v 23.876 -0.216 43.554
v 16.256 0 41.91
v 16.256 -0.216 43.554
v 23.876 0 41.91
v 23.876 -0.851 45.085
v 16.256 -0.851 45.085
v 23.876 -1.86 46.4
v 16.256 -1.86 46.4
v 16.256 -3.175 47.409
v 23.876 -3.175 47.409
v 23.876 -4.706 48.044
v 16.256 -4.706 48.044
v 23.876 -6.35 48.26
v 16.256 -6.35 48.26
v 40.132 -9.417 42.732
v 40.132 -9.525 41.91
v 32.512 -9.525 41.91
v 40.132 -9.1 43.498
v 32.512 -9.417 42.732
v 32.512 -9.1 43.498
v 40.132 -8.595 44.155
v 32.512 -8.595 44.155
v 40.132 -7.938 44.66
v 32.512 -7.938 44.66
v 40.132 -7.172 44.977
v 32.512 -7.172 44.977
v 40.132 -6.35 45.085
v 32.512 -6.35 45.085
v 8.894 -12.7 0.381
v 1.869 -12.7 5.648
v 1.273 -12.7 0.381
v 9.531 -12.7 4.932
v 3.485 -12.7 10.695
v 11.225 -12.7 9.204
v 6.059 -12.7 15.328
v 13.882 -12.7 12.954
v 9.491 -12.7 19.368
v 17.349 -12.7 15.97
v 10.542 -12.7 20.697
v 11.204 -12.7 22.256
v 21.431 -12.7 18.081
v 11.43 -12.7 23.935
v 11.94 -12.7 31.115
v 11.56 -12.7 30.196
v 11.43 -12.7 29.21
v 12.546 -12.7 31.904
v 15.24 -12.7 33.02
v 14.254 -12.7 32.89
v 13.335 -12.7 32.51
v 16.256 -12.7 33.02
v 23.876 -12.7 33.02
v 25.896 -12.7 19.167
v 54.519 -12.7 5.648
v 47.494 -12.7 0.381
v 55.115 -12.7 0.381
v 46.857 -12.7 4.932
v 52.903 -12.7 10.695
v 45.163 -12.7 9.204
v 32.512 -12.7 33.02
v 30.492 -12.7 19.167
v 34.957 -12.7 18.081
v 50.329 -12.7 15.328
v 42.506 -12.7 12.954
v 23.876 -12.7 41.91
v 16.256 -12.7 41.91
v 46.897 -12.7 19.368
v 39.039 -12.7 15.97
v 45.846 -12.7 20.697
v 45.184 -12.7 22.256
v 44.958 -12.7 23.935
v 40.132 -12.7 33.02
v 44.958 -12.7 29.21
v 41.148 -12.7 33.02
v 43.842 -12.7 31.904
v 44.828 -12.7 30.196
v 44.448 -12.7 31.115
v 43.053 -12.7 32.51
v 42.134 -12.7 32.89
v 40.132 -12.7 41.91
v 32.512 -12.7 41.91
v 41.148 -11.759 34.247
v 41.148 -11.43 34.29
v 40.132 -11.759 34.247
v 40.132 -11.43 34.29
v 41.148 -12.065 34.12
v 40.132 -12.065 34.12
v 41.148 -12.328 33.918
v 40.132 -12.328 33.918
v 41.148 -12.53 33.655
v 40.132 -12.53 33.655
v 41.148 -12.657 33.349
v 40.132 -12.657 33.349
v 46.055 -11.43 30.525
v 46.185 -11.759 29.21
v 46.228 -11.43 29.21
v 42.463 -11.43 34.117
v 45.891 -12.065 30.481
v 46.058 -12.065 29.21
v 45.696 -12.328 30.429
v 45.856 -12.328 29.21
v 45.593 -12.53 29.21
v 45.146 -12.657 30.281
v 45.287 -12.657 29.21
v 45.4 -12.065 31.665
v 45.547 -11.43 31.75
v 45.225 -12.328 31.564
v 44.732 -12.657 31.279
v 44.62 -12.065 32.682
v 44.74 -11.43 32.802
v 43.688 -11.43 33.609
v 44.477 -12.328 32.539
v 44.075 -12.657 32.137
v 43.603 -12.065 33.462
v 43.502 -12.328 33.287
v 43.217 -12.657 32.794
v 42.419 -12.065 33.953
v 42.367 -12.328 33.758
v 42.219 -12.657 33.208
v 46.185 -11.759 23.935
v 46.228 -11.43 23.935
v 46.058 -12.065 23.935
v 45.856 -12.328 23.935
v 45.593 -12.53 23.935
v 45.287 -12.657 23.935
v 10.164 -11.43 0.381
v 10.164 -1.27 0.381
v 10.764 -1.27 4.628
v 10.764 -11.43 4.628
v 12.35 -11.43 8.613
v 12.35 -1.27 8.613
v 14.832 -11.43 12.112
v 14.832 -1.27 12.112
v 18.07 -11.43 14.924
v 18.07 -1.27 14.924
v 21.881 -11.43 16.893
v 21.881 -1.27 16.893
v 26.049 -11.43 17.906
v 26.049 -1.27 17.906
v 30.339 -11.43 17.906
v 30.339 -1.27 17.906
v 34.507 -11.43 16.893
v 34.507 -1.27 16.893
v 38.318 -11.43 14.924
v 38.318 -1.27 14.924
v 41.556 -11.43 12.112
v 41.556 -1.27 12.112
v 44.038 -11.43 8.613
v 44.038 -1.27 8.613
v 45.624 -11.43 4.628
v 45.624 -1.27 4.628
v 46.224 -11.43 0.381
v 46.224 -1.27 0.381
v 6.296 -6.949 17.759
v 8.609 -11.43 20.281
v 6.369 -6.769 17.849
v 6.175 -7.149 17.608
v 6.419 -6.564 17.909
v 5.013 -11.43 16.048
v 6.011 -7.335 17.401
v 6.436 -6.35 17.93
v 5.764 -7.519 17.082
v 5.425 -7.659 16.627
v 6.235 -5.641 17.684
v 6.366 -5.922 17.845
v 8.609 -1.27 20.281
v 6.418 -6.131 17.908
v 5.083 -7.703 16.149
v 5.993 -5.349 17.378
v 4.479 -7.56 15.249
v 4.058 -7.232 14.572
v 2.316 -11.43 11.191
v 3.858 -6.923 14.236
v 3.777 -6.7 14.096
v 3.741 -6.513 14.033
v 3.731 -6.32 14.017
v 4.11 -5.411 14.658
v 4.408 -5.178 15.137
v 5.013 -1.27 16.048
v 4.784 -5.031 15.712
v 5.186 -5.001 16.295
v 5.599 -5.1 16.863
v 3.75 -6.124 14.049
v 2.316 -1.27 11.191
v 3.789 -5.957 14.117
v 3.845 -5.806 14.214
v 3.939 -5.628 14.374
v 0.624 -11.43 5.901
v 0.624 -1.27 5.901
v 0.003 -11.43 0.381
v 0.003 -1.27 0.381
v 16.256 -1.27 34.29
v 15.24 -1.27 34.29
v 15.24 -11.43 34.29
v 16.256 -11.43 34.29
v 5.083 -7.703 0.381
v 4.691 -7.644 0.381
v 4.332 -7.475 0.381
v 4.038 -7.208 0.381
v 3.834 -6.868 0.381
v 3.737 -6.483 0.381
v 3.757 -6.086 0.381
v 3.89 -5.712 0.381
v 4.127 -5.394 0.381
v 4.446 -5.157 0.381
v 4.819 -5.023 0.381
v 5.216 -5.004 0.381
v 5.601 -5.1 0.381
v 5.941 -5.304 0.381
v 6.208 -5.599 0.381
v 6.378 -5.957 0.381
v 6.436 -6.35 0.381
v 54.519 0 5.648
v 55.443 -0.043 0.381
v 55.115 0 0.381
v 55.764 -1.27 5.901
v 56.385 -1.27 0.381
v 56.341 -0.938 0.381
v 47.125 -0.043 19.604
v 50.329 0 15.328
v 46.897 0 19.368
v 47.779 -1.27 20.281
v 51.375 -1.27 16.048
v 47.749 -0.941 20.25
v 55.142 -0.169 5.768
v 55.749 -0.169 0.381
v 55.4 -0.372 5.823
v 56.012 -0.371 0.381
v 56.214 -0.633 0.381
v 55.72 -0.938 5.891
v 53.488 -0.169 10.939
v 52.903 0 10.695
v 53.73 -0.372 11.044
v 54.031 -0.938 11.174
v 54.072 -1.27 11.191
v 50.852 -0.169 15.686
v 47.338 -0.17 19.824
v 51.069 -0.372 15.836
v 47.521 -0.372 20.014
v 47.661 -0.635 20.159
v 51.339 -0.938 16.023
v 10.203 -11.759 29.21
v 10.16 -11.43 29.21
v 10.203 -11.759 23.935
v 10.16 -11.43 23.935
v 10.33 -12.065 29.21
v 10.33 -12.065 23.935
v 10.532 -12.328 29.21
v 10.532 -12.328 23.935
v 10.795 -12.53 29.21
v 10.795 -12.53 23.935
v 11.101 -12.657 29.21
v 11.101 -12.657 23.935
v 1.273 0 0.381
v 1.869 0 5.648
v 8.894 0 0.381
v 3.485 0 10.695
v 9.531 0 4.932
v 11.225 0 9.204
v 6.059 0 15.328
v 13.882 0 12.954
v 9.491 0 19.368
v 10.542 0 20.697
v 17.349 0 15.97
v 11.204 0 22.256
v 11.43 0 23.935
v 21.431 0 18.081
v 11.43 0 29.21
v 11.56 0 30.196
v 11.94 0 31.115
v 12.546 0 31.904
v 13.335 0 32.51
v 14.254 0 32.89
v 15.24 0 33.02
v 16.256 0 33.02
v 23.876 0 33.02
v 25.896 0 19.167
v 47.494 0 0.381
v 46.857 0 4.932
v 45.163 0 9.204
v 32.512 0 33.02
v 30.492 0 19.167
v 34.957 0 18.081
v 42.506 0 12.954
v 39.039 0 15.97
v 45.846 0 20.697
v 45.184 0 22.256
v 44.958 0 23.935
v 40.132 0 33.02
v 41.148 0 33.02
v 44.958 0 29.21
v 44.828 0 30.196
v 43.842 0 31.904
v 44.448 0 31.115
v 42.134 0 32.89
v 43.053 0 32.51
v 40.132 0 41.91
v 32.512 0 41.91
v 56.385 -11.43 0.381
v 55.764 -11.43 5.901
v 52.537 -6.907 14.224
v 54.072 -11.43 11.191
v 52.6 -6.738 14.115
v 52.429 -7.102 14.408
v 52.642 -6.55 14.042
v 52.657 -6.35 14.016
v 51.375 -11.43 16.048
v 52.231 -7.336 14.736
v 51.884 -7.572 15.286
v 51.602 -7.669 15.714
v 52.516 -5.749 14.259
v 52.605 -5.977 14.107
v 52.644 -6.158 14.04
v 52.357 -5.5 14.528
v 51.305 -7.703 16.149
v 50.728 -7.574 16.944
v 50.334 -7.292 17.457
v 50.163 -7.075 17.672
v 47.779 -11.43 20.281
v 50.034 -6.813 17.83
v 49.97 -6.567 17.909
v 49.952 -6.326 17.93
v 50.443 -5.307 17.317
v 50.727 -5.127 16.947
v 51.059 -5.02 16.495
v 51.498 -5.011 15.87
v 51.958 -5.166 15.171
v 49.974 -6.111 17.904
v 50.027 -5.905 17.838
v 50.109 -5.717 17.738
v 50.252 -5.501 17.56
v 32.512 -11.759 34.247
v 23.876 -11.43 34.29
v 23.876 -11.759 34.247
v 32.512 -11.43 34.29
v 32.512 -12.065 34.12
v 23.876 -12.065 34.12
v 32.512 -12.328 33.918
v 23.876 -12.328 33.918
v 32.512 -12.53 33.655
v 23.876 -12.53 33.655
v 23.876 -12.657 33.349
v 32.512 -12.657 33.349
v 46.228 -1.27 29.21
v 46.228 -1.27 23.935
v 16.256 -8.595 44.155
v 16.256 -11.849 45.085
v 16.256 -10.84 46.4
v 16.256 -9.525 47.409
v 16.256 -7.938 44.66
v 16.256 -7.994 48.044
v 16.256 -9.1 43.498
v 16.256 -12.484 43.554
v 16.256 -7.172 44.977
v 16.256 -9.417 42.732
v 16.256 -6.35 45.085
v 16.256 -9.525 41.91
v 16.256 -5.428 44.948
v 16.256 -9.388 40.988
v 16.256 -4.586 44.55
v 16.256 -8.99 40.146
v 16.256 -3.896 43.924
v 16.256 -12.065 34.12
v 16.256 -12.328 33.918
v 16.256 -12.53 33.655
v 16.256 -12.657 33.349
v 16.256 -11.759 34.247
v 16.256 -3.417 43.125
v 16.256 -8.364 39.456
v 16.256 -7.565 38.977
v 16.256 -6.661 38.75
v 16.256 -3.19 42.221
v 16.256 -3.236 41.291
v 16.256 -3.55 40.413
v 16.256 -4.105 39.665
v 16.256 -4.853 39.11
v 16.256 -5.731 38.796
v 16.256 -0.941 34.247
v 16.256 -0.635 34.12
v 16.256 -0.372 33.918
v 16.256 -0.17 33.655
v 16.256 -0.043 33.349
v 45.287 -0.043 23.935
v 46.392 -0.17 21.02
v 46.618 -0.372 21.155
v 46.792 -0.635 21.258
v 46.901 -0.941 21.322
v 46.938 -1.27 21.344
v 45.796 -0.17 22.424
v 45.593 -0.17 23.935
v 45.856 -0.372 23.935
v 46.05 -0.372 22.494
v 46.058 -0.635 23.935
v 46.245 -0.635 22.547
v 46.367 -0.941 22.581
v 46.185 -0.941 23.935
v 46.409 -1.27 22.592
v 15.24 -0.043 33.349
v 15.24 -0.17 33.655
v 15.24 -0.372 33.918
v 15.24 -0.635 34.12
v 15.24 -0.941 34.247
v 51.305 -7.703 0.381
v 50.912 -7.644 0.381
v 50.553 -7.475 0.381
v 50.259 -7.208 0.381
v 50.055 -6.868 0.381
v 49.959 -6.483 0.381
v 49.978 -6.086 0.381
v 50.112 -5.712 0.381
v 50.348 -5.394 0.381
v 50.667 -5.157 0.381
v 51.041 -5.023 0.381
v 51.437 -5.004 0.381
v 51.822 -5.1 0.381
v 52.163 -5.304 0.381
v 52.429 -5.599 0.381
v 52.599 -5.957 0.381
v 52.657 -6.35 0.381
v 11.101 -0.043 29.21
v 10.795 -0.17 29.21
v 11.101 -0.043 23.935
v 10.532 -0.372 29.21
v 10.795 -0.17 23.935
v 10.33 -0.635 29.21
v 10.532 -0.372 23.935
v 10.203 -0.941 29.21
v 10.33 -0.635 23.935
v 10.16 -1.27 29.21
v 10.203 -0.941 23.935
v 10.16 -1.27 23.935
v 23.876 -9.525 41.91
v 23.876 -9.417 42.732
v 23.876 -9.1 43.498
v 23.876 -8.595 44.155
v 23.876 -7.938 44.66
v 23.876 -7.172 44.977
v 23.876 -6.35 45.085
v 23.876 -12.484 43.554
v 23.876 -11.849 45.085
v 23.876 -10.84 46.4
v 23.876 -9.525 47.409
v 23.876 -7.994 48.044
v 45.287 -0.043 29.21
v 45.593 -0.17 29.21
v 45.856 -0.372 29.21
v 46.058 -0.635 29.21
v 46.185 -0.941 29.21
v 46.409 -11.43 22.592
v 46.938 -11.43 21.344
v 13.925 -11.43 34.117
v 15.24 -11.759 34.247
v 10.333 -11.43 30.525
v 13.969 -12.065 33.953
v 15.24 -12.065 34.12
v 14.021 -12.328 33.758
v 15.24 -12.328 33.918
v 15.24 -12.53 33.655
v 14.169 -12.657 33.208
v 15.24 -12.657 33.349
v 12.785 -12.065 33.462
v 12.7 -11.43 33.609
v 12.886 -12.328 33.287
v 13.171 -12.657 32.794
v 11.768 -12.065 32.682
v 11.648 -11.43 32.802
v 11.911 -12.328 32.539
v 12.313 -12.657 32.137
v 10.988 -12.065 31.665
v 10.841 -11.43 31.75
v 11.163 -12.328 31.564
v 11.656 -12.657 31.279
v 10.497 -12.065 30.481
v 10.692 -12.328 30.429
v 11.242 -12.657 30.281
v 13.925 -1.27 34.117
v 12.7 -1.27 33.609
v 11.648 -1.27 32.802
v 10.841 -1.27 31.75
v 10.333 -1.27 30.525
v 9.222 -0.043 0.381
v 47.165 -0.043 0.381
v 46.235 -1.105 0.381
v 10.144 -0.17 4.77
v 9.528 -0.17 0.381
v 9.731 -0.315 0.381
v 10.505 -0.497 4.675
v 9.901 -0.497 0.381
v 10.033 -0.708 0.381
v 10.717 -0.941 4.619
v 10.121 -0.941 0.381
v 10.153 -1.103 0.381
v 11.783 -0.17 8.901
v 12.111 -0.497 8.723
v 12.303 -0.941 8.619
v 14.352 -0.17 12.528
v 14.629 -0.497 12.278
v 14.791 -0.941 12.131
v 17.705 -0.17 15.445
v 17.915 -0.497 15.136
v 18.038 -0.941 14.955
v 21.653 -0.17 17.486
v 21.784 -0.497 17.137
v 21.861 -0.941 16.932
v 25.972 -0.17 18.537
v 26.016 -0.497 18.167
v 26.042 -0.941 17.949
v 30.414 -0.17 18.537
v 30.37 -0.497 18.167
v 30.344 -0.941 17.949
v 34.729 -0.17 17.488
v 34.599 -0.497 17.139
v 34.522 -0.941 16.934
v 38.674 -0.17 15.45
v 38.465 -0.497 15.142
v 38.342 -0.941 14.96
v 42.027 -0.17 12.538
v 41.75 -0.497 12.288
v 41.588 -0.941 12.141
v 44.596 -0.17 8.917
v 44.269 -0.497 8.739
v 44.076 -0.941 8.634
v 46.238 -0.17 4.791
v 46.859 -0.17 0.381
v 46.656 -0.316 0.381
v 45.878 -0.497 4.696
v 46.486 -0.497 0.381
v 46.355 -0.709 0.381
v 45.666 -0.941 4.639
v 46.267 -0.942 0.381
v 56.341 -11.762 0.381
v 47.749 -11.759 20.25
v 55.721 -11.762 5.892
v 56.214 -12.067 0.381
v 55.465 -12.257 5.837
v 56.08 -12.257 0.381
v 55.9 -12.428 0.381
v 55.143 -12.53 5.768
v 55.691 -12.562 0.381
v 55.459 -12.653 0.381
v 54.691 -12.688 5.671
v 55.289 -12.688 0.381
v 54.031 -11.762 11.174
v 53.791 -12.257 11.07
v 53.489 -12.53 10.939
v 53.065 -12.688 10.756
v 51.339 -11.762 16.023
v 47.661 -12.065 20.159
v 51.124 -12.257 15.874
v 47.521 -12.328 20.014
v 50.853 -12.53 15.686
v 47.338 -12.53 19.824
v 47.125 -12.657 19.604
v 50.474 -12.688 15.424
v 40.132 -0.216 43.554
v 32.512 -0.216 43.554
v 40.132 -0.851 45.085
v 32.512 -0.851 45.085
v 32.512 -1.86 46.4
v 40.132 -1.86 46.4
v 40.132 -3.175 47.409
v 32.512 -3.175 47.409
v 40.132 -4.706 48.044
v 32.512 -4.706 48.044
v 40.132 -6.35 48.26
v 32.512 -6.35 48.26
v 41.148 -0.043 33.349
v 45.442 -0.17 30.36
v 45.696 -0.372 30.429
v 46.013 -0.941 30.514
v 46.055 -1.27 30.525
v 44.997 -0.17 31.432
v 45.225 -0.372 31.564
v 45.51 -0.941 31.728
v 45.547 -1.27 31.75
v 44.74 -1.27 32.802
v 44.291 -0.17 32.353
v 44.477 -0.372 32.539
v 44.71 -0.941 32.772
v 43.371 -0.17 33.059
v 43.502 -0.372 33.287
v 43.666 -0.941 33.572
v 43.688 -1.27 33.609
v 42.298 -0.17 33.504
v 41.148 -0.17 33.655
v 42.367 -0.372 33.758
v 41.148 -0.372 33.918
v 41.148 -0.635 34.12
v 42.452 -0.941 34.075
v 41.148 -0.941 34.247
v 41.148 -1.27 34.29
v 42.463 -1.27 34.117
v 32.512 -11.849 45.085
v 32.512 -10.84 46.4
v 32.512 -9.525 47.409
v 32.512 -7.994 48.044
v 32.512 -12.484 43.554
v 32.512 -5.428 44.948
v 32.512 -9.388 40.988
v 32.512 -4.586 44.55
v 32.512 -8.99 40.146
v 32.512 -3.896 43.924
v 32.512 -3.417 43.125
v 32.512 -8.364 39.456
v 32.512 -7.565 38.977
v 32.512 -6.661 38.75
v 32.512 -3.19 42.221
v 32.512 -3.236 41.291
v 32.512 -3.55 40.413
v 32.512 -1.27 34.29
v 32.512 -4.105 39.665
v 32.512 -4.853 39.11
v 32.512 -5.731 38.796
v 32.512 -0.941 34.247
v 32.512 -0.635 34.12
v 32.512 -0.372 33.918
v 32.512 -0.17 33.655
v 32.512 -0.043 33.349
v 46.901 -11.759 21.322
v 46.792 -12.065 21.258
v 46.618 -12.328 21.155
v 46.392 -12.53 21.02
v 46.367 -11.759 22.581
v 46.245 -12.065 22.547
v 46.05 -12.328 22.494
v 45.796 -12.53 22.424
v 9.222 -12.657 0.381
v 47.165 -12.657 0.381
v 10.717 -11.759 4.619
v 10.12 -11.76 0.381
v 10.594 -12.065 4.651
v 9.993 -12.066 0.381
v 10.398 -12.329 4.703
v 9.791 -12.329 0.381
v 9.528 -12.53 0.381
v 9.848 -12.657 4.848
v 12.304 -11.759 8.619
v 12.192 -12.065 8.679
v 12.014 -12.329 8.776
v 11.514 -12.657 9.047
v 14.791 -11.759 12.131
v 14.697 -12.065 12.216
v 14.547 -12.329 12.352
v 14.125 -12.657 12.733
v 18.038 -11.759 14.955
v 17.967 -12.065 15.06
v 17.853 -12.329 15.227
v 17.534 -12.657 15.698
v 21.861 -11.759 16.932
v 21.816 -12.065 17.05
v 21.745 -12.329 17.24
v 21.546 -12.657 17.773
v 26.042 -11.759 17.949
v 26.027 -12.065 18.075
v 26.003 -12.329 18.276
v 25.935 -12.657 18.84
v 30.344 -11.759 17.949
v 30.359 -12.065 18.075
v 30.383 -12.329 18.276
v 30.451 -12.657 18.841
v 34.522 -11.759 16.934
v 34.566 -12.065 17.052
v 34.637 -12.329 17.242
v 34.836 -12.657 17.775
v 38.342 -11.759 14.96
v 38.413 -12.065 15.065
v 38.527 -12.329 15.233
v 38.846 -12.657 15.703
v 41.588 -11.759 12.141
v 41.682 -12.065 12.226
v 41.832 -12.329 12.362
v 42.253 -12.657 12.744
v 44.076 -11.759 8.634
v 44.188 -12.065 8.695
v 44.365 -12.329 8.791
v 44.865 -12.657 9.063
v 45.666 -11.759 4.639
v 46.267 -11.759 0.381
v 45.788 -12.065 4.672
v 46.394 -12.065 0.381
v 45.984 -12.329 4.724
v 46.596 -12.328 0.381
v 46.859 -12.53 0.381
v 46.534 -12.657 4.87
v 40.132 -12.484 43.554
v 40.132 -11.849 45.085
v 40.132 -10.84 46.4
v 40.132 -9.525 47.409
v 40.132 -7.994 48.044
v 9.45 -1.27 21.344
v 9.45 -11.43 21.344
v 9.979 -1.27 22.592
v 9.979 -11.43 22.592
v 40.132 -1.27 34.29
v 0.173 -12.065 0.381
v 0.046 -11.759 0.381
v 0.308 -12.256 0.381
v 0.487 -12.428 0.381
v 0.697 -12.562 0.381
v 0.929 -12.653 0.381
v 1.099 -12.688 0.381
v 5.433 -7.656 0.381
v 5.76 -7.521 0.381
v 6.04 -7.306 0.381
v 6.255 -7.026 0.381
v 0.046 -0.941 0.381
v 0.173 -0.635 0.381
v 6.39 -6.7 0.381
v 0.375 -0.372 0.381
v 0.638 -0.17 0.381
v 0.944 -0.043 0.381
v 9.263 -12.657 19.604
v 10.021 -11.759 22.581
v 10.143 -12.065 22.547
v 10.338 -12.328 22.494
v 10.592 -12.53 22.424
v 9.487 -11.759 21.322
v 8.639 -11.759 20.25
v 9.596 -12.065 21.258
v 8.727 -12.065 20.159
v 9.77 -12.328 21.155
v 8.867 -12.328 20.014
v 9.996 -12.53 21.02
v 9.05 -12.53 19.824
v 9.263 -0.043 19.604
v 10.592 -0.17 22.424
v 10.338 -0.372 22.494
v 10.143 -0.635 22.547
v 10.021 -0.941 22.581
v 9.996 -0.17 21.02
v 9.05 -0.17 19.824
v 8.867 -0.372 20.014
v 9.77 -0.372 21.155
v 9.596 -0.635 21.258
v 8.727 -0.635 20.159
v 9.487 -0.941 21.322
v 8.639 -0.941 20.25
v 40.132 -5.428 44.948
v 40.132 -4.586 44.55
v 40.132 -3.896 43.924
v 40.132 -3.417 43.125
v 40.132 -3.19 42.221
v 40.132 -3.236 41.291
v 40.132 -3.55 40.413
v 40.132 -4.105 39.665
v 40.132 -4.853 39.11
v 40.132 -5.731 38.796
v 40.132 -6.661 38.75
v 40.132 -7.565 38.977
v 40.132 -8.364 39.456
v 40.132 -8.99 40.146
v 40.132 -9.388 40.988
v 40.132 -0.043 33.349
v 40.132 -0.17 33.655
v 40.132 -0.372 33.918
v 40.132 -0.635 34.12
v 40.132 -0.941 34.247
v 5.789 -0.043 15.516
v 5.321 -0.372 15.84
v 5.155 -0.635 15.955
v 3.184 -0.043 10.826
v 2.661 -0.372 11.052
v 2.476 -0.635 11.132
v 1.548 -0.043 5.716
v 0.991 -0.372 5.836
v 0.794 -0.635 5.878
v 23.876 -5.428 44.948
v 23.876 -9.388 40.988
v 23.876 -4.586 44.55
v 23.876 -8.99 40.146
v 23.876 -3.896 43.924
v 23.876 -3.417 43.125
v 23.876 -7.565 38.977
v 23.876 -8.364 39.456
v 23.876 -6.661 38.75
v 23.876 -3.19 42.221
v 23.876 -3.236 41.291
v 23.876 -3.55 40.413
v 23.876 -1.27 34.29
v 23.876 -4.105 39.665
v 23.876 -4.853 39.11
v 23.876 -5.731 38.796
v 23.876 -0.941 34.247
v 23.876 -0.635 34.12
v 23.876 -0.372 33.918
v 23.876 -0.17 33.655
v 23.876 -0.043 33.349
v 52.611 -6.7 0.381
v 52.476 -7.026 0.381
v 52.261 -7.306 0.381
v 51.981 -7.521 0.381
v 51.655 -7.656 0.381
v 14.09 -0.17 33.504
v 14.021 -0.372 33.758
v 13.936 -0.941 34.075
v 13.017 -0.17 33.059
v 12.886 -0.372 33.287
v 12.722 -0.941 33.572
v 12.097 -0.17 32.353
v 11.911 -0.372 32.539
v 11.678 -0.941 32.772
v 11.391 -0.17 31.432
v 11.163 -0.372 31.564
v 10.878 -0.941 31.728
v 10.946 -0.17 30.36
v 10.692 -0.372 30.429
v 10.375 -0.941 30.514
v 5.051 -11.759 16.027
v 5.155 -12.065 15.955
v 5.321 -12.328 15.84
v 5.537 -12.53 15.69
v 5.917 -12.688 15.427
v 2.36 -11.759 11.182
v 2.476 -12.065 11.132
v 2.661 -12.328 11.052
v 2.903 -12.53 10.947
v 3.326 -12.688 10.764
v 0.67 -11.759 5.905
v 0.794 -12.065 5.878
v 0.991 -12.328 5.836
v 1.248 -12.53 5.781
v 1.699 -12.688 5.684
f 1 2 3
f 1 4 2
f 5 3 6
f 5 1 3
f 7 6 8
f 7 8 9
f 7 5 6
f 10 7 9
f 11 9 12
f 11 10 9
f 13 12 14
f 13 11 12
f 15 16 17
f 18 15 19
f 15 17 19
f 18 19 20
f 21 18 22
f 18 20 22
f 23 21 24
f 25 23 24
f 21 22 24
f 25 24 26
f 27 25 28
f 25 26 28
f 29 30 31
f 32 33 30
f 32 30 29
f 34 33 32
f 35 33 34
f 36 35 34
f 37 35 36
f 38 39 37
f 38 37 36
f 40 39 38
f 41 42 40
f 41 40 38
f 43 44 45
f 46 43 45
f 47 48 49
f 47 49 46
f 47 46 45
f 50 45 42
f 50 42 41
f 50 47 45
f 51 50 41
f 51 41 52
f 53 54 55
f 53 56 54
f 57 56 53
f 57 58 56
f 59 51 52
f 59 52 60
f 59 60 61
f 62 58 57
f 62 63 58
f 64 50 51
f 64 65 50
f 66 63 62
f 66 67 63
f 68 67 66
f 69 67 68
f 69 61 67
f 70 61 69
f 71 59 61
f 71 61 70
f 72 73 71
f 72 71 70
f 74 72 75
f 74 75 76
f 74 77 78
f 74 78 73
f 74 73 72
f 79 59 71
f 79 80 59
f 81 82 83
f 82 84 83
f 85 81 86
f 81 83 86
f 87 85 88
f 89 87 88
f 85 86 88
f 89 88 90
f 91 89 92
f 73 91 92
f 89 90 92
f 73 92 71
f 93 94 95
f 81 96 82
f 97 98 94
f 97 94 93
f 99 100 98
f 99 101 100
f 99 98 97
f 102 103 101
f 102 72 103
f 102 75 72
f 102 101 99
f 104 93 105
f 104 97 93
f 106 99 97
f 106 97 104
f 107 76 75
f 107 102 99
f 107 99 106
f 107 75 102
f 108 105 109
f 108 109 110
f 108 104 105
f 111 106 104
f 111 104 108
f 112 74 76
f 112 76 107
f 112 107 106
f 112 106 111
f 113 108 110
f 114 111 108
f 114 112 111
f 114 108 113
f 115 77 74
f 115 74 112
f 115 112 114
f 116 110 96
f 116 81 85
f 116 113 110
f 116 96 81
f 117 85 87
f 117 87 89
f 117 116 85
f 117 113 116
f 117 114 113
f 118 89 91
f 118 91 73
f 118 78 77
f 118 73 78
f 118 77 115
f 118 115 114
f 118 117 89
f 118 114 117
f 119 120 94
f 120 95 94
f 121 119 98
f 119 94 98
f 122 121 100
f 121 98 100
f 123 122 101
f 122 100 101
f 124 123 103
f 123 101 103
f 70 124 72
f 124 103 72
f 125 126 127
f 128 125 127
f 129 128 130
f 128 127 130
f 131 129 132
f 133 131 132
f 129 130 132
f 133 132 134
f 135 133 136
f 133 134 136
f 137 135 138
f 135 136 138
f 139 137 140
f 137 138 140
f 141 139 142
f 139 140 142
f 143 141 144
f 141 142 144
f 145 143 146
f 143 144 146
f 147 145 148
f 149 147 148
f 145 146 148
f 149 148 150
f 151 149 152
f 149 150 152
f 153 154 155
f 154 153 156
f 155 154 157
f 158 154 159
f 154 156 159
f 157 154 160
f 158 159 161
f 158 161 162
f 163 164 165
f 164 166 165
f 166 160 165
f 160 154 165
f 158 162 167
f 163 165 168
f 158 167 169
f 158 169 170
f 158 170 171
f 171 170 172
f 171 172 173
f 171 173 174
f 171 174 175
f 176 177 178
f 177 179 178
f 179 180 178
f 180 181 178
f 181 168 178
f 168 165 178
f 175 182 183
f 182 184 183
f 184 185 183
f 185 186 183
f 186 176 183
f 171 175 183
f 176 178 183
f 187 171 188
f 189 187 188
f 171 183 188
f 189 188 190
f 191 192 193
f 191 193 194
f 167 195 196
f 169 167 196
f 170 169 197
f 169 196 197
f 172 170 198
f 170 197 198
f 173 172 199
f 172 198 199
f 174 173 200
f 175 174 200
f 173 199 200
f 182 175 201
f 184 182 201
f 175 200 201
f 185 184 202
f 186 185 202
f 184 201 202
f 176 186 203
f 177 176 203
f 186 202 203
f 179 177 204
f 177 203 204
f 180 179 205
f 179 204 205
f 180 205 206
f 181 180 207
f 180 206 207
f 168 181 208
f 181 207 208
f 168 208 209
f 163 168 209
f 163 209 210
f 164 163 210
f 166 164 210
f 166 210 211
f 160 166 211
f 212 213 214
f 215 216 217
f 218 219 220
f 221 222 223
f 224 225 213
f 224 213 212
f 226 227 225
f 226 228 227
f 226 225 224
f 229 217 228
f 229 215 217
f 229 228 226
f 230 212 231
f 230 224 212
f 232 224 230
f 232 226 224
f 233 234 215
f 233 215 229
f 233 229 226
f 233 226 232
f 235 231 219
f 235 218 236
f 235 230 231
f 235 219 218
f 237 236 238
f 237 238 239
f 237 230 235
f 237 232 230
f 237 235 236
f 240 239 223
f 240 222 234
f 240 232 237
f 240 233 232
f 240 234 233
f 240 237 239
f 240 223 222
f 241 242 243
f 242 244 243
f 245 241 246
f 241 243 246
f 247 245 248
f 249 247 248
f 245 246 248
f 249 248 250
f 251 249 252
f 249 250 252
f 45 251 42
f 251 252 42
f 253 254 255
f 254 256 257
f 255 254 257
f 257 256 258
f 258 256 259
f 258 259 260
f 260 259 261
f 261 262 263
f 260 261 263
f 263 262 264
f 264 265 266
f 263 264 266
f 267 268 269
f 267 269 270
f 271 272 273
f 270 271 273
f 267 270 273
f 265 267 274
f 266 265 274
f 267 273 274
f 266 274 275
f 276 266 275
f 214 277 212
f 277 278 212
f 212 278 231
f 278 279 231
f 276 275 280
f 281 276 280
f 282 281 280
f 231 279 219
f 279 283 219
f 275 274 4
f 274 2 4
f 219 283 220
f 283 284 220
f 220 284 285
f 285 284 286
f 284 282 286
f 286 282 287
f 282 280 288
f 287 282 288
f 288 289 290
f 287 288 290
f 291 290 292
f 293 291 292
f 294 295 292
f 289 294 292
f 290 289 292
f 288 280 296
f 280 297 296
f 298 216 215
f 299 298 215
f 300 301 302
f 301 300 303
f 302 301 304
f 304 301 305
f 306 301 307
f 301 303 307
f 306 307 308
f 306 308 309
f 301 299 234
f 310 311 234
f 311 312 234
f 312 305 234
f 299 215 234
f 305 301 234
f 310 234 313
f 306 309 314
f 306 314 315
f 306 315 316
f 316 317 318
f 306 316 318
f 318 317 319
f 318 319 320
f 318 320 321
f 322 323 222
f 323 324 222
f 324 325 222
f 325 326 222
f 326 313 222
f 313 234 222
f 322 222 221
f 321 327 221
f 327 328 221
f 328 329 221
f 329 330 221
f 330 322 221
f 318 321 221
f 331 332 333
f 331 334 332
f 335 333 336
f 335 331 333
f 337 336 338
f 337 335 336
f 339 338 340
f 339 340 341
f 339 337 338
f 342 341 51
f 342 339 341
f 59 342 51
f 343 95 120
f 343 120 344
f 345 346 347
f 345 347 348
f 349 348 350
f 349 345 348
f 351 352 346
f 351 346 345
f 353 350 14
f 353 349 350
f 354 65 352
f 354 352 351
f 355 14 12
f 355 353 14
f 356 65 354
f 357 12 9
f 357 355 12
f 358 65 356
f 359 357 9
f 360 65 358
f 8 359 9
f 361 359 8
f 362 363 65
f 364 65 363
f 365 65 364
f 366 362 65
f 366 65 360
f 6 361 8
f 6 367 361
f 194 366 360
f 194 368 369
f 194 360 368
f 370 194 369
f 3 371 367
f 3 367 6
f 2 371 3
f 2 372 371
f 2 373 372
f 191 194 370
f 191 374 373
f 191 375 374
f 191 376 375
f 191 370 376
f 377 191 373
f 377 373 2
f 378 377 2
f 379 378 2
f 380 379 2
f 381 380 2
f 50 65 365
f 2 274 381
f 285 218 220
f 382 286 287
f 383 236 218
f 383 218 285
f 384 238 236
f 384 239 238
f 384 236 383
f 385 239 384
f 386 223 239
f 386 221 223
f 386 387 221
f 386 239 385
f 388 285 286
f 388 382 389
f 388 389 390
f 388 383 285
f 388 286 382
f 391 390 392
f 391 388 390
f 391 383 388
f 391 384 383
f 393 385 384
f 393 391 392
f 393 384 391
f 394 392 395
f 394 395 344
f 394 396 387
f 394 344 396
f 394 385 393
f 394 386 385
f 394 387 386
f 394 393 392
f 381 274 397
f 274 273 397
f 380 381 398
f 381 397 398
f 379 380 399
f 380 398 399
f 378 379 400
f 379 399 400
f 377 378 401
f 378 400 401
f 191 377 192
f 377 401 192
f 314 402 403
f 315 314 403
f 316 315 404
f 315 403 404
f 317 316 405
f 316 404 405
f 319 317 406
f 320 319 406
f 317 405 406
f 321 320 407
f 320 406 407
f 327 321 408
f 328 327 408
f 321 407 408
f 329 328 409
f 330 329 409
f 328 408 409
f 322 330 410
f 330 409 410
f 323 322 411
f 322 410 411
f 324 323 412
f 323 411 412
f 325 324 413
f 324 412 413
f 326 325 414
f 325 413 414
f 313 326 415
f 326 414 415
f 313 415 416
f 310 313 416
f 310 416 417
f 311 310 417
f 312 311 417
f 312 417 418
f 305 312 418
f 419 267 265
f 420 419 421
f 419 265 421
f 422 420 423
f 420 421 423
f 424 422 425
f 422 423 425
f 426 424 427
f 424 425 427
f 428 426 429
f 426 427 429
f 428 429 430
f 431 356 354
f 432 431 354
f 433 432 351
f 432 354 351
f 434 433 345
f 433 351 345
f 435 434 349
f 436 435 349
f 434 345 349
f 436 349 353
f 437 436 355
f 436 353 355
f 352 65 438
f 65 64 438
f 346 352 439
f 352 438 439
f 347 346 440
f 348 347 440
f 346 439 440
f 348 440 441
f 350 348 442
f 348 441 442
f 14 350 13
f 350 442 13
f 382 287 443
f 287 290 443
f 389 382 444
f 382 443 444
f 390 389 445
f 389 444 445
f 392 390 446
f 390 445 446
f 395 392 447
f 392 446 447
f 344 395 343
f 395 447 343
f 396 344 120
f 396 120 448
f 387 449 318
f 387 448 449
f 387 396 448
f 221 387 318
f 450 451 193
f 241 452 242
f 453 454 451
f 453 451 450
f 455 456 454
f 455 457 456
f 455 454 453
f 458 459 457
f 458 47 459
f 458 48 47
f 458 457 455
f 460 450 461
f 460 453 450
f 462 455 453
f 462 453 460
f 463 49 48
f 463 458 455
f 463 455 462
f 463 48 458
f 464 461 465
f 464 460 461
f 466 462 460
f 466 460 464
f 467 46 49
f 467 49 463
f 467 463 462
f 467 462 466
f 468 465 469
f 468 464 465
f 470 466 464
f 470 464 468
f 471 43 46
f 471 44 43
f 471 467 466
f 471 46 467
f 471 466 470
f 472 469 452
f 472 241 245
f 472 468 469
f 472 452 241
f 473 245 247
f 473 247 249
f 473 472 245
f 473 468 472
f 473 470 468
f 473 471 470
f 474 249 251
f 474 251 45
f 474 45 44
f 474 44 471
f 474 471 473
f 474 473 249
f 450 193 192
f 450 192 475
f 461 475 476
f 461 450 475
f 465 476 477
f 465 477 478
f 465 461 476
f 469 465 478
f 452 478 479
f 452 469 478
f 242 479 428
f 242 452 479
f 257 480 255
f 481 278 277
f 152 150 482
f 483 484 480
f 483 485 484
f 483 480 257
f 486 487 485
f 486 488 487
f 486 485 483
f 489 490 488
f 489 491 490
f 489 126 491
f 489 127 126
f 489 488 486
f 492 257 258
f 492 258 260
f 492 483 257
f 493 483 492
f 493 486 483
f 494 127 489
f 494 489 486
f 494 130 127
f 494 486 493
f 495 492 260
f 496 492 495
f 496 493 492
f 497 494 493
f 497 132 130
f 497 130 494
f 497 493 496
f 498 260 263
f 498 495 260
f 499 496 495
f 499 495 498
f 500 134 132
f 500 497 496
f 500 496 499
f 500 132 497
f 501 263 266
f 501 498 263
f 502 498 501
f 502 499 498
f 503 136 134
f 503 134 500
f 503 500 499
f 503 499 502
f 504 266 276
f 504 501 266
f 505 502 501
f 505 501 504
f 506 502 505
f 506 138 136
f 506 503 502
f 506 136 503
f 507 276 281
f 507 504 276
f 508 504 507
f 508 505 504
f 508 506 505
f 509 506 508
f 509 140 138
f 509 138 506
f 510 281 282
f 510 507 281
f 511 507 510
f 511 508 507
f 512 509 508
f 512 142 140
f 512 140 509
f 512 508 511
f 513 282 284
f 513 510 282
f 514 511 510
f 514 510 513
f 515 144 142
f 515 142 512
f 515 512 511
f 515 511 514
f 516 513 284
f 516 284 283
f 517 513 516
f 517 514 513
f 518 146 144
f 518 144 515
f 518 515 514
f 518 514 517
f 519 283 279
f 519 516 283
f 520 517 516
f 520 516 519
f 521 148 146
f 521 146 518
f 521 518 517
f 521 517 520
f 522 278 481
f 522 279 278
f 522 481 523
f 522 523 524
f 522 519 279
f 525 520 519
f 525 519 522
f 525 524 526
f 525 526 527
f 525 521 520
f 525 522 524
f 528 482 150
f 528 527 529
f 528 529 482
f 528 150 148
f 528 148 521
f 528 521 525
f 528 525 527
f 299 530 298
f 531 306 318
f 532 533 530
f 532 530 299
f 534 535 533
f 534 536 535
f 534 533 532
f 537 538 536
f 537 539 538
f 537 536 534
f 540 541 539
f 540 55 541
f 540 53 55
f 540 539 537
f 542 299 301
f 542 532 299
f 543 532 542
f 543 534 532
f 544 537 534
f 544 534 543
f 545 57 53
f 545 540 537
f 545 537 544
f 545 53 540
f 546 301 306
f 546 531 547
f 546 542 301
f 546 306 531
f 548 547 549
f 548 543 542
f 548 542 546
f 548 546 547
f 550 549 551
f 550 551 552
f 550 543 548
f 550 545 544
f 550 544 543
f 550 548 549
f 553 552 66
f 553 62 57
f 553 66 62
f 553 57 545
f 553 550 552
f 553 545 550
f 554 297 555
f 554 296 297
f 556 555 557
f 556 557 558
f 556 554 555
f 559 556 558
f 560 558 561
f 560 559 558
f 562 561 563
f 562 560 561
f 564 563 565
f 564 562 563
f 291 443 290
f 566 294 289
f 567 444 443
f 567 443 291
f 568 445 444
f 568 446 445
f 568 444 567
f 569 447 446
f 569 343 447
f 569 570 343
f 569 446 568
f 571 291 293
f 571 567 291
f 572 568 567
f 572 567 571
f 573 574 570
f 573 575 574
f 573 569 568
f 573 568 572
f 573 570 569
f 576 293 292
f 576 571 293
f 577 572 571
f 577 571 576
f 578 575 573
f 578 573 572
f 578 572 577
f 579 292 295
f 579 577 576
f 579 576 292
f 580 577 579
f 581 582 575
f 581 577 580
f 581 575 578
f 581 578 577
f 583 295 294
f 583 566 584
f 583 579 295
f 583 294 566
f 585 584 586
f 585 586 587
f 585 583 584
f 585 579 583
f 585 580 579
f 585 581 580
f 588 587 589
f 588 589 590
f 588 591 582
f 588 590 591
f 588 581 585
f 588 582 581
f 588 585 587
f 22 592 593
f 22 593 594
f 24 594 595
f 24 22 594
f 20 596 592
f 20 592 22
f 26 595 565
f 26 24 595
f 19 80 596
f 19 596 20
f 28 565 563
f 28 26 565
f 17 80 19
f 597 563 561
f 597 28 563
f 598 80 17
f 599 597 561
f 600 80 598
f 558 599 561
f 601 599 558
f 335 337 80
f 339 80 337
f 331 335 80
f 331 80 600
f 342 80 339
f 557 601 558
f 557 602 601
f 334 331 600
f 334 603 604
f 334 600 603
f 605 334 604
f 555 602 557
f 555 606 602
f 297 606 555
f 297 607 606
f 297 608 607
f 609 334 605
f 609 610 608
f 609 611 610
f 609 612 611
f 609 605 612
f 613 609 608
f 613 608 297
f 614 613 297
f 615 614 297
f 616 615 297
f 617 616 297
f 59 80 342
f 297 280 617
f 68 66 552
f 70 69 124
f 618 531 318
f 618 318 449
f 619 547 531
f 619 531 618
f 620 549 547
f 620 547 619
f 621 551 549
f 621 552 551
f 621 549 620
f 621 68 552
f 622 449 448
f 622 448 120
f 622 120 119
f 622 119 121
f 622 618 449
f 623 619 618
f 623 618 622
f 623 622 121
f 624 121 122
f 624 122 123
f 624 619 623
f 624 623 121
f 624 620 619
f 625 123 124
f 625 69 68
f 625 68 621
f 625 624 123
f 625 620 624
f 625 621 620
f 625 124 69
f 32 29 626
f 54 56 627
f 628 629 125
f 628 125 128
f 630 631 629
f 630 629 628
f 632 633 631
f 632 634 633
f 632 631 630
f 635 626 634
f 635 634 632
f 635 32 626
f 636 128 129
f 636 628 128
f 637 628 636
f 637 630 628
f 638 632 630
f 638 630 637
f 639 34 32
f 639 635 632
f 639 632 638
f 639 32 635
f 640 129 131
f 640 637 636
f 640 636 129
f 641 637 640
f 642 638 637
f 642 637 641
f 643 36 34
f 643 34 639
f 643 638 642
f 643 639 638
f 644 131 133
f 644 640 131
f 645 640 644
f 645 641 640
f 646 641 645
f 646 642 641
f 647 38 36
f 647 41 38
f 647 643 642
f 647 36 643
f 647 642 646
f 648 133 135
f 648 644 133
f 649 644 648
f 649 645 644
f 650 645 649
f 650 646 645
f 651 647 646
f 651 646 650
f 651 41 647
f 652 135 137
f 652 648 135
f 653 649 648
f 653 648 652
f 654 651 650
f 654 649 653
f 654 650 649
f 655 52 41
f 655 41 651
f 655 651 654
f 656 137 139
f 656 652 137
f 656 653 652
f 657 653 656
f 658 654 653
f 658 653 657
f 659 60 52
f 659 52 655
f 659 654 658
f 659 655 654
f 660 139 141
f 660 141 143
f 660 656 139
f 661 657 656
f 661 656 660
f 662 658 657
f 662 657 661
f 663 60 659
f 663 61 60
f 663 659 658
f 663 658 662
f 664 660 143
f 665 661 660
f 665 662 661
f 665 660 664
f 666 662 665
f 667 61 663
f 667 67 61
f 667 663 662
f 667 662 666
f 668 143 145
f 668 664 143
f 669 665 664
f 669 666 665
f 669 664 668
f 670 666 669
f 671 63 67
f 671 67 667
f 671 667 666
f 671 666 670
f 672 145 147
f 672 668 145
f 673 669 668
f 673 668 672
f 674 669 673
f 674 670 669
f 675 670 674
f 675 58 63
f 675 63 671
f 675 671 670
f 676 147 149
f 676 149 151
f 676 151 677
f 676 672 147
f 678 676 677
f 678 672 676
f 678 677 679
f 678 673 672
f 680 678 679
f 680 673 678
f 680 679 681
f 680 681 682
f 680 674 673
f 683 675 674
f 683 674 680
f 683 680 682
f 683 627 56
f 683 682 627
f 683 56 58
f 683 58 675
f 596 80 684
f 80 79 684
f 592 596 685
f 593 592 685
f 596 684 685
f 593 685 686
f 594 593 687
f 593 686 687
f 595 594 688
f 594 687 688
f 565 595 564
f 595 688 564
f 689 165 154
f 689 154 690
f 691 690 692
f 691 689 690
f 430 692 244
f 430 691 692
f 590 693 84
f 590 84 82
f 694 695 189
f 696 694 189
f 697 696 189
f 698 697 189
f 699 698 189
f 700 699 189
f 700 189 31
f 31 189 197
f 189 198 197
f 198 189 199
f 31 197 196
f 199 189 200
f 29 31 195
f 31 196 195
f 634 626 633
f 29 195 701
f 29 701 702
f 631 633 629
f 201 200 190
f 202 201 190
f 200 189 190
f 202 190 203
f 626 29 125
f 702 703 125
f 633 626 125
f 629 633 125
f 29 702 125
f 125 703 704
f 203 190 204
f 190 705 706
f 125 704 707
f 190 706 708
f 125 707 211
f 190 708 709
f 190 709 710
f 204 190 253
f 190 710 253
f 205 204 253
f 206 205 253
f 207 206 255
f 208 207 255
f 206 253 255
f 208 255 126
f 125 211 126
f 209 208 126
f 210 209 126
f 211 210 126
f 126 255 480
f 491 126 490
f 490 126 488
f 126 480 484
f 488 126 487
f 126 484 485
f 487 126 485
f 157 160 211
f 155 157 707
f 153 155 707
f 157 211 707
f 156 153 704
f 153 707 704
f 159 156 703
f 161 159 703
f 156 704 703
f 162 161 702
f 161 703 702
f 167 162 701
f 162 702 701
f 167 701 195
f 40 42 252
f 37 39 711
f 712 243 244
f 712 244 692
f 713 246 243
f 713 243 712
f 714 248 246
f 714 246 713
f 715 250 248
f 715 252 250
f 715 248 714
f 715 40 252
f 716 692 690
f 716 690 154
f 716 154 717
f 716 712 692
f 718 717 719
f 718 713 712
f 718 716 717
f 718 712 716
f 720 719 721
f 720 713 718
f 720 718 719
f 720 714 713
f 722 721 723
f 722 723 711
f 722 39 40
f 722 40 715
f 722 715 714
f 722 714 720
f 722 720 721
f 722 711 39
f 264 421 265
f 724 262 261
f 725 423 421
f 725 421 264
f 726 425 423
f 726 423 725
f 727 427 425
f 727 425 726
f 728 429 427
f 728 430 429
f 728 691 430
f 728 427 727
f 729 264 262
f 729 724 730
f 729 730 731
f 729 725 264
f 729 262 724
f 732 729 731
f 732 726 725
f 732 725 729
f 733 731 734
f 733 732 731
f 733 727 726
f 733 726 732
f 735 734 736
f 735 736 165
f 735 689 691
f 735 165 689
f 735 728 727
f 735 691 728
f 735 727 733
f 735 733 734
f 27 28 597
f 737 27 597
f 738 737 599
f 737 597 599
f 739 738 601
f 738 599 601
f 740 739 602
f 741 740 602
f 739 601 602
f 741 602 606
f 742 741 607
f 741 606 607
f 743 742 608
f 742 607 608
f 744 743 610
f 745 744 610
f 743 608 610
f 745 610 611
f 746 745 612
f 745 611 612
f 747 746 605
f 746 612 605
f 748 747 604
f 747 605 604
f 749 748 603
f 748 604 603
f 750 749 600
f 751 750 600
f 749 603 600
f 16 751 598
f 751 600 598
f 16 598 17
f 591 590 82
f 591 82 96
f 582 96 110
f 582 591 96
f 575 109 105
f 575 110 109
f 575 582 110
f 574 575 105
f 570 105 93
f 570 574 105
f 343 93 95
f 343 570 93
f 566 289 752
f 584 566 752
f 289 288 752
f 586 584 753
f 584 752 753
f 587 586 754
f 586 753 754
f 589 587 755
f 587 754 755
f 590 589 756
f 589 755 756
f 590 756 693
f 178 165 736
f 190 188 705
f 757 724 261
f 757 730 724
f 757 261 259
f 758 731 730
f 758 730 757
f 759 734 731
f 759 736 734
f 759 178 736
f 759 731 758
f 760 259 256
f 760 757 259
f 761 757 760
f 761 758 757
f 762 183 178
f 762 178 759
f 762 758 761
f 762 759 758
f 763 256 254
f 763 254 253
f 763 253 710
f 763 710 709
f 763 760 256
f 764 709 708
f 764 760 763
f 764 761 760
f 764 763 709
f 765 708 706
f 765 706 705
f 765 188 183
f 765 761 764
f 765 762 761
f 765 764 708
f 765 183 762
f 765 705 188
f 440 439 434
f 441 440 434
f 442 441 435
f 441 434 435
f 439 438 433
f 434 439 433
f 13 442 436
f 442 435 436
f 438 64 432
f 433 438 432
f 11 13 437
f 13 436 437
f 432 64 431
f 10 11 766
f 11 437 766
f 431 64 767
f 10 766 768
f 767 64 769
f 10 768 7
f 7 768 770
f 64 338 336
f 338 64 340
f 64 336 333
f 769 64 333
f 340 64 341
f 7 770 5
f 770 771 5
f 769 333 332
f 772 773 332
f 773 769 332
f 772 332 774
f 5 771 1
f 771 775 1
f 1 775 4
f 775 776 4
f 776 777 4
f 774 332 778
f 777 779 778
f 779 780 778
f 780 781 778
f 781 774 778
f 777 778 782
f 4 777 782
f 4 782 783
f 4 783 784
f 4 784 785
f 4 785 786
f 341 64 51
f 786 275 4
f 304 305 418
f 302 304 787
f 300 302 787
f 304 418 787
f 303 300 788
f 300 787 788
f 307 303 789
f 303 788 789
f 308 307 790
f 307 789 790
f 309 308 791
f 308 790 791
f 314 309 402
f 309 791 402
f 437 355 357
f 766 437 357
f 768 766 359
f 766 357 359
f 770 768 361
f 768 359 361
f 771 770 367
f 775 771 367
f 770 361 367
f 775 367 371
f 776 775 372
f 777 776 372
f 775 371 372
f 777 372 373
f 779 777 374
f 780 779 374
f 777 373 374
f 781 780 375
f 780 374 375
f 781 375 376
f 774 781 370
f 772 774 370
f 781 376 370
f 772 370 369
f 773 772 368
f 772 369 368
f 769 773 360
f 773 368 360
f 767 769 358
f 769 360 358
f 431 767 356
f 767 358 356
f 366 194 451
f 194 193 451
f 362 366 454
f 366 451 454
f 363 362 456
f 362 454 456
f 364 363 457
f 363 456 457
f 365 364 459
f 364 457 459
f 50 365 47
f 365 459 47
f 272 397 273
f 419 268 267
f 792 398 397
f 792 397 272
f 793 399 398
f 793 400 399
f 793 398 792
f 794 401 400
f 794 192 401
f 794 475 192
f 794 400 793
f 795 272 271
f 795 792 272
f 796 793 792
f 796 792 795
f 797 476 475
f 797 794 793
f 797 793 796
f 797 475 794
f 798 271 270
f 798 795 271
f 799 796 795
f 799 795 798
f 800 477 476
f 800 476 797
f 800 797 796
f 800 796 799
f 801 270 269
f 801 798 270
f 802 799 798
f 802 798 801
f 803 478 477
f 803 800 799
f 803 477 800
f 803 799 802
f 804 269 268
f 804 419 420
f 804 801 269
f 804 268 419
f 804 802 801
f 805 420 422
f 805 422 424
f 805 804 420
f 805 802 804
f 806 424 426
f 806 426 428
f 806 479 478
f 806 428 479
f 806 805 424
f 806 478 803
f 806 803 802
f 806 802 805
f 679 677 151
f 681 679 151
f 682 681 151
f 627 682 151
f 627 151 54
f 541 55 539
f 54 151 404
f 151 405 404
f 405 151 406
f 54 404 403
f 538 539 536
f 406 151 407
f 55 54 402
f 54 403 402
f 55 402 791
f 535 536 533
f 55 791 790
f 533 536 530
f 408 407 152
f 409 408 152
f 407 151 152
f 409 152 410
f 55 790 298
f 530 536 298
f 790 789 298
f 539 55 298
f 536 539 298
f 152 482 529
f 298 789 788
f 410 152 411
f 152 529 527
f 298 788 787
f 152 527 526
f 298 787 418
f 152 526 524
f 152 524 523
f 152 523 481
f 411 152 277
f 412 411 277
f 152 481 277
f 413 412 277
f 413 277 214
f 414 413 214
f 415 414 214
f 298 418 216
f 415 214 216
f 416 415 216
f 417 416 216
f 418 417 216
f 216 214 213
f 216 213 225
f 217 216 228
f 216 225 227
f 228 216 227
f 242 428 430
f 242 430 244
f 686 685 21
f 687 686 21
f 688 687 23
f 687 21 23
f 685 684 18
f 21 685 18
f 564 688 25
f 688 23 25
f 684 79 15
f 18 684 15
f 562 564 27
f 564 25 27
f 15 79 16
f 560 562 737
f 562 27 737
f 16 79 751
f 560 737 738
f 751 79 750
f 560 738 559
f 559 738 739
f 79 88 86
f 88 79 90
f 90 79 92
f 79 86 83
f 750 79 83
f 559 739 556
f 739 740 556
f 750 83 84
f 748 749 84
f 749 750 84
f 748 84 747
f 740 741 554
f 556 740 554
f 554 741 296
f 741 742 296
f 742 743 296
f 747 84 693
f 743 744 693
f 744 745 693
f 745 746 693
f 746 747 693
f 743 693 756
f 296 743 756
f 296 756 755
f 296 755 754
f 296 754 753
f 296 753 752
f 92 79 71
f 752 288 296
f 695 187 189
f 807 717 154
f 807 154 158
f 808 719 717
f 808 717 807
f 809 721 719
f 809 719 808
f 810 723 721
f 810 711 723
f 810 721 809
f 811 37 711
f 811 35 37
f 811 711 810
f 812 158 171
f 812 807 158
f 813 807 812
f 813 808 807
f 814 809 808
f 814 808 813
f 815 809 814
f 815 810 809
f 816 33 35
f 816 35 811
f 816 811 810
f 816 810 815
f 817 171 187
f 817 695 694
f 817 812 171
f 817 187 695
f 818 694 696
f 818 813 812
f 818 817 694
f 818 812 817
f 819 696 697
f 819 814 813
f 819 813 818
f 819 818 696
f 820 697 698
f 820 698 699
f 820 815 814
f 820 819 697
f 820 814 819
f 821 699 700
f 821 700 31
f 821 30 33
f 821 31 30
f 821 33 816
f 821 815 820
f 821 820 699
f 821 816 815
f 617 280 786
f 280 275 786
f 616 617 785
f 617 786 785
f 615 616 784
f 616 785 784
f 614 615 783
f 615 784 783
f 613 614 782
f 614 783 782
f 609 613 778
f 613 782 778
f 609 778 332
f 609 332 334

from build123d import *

# Parameters (mm, degrees)
F1_DEPTH  = 12.7
F5_W      = 7.62
F5_H      = 12.7
F6_DEPTH  = 13.97
F8_DEPTH  = 23.876
F9_R      = 6.34999
F10_R     = 5.08
F12_DEPTH = 18.5489899089
F14_DEPTH = 18.5489899089
F15_R     = 1.27


# Not quite as in the source:
# - a fillet or chamfer is up to 0.001 mm smaller than in the source, because OpenCascade refuses the exact size


with BuildPart() as f1:
    # F0 (on Front) → F1 (new body)
    with BuildSketch(Plane.XZ):
        with BuildLine():
            ThreePointArc((56.3854255581, 0.381), (28.194, 28.194), (0.0025744419, 0.381))
            Line((0.0025744419, 0.381), (10.1640250971, 0.381))
            ThreePointArc((10.1640250971, 0.381), (28.194, 18.034), (46.2239749029, 0.381))
            Line((46.2239749029, 0.381), (56.3854255581, 0.381))
        make_face()
    extrude(amount=F1_DEPTH)

    # F3 (on offset) → F4 (join, up to the next surface of F1)
    with BuildSketch(Plane.XY.offset(34.29)):
        Polygon((28.194, 0), (10.16, 0), (10.16, -12.7), (46.228, -12.7), (46.228, 0), align=None)
    extrude(until=Until.NEXT, dir=(0, 0, -1))

    # F5 (on face) → F6 (join)
    with BuildSketch(Plane.XY.offset(34.29)):
        with Locations((20.066, -6.35)):
            Rectangle(F5_W, F5_H)
        with Locations((36.322, -6.35)):
            Rectangle(F5_W, F5_H)
    extrude(amount=F6_DEPTH)

    # F7 (on face) → F8 (cut, through all)
    with BuildSketch(Plane(origin=(16.256, 0, 0), x_dir=(0, -1, 0), z_dir=(-1, 0, 0))):
        with BuildLine():
            ThreePointArc((9.525, 41.91), (8.5950640303, 44.1550640303), (6.35, 45.085))
            ThreePointArc((6.35, 45.085), (4.1049359697, 39.6649359697), (9.525, 41.91))
        make_face()
    extrude(amount=-F8_DEPTH, mode=Mode.SUBTRACT)

    # F9 (radius 6.35 in the source; OpenCascade refuses exactly that, so slightly less here)
    f9_edges = [f1.edges().sort_by_distance(p)[0] for p in [
        (20.066, -12.7, 48.26),
        (20.066, 0, 48.26),
        (36.322, -12.7, 48.26),
        (36.322, 0, 48.26),
    ]]
    fillet(f9_edges, radius=F9_R)

    # F10
    f10_edges = [f1.edges().sort_by_distance(p)[0] for p in [
        (10.16, -6.35, 34.29),
        (10.16, -6.35, 21.672021),
        (46.228, -6.35, 34.29),
        (46.228, -6.35, 21.672021),
    ]]
    fillet(f10_edges, radius=F10_R)

    # F11 (on face) → F12 (cut, up to face)
    with BuildSketch(Plane(origin=(0, 0, 0.381), x_dir=(1, 0, 0), z_dir=(0, 0, -1))):
        with BuildLine():
            ThreePointArc((52.6572502305, 6.35), (52.2610975074, 7.3063972769), (51.3047002305, 7.70255))
            ThreePointArc((51.3047002305, 7.70255), (50.3483029536, 5.3936027231), (52.6572502305, 6.35))
        make_face()
    extrude(amount=-F12_DEPTH, mode=Mode.SUBTRACT)

    # F13 (on face) → F14 (cut, up to face)
    with BuildSketch(Plane(origin=(0, 0, 0.381), x_dir=(1, 0, 0), z_dir=(0, 0, -1))):
        with BuildLine():
            ThreePointArc((6.4358497695, 6.35), (6.0396970464, 7.3063972769), (5.0832997695, 7.70255))
            ThreePointArc((5.0832997695, 7.70255), (4.1269024926, 5.3936027231), (6.4358497695, 6.35))
        make_face()
    extrude(amount=-F14_DEPTH, mode=Mode.SUBTRACT)

    # F15
    f15_edges = [f1.edges().sort_by_distance(p)[0] for p in [
        (28.194, 0, 18.034),
        (2.316329, 0, 11.191416),
        (2.316329, -12.7, 11.191416),
        (28.194, -12.7, 18.034),
        (54.071671, -12.7, 11.191416),
        (54.071671, 0, 11.191416),
        (28.194, 0, 34.29),
        (28.194, -12.7, 34.29),
    ]]
    fillet(f15_edges, radius=F15_R)


solid = f1.part
